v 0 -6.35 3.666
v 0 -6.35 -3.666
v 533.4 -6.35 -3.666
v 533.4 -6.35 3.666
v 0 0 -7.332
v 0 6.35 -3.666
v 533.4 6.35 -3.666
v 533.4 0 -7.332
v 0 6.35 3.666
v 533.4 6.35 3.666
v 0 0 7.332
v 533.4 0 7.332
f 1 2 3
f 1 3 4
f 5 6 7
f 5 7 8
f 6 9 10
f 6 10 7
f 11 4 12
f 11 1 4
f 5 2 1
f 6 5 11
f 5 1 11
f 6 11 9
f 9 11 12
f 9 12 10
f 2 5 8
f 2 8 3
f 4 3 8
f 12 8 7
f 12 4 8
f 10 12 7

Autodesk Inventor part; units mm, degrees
ref_plane "YZ Plane" through (0, 0, 0) normal (1, 0, 0) x (0, 1, 0)
ref_plane "XZ Plane" through (0, 0, 0) normal (0, 1, 0) x (-1, 0, 0)
ref_plane "XY Plane" through (0, 0, 0) normal (0, 0, 1) x (1, 0, 0)
sketch "Sketch1" plane through (0, 0, 0) normal (1, 0, 0) x (0, 1, 0)
  line L0 (6.35, 3.6662) -> (6.35, -3.6662)
  line L1 (6.35, -3.6662) -> (0, -7.3323)
  line L2 (0, -7.3323) -> (-6.35, -3.6662)
  line L3 (-6.35, -3.6662) -> (-6.35, 3.6662)
  line L4 (-6.35, 3.6662) -> (0, 7.3323)
  line L5 (0, 7.3323) -> (6.35, 3.6662)
  point P0 (0, 0)
  dimension "d0" = 12.7
  dimension "d1" = 12.7
  dimension "d2" = 12.7
  dimension "d3" = 6.35
  dimension "d4" = 120
  dimension "d5" = 120
  dimension "d6" = 6.35
  dimension "d7" = 6.35
extrude "Extrusion1" add sketch "Sketch1" along normal blind 533.4
properties part number "0.5 hex shaft long"
